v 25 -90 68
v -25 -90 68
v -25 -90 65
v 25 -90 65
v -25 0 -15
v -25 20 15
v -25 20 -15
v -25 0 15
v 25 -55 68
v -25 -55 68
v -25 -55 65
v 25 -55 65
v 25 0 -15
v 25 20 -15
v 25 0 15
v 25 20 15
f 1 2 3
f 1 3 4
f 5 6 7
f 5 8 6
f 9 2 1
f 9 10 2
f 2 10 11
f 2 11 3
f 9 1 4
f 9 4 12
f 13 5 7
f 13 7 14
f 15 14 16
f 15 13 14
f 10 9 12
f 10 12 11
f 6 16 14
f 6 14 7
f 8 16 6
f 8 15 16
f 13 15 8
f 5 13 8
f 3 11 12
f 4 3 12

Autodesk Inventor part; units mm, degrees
ref_plane "YZ Plane" through (0, 0, 0) normal (1, 0, 0) x (0, 1, 0)
ref_plane "XZ Plane" through (0, 0, 0) normal (0, 1, 0) x (-1, 0, 0)
sketch "Skizze1" plane through (0, 0, 0) normal (0, 1, 0) x (-1, 0, 0)
  line L0 (25, -15) -> (-25, -15)
  line L1 (-25, -15) -> (-25, 15)
  line L2 (-25, 15) -> (25, 15)
  line L3 (25, 15) -> (25, -15)
  line L4 (35, 0) -> (-35, 0) projected
  line L5 (0, -38.6491) -> (0, 126.8947) projected
  point P0 (0, 0)
  dimension "d0" = 50
  dimension "d1" = 30
extrude "Extrusion1" add sketch "Skizze1" along normal blind 20
ref_plane "Arbeitsebene1" through (-25, 0, 68) normal (0, 0, 1) x (1, 0, 0)
sketch "Skizze10" plane through (-25, 0, 68) normal (0, 0, 1) x (1, 0, 0)
  line L0 (50, -55) -> (0, -55)
  line L1 (0, -55) -> (0, -90)
  line L2 (0, -90) -> (50, -90)
  line L3 (50, -90) -> (50, -55)
  line L4 (0, 0) -> (50, 0) projected
  line L5 (25, -112) -> (25, 42) projected
  point P0 (25, 0)
  dimension "d44" = 50
  dimension "d45" = 35
  dimension "d46" = 55
extrude "Extrusion7" add sketch "Skizze10" against normal blind 3
sketch "Skizze11" plane through (-25, 0, 15) normal (0, 0, 1) x (1, 0, 0)
  ellipse E0 centre (25, 10) end of major axis (45, 10) minor radius 7.5
  line L0 (0, 0) -> (50, 0) projected
  line L1 (50, 0) -> (50, 20) projected
  point P0 (25, 0)
  dimension "d49" = 10
  dimension "d50" = 25
  dimension "d51" = 20
  dimension "d52" = 7.5
sketch "Skizze12" plane through (0, 0, 0) normal (1, 0, 0) x (0, 1, 0)
  line L0 (0, 15) -> (20, 15) projected
  line L1 (-55, 68) -> (-90, 68) projected
  spline S0 degree 4 poles (10, 15) (9.9748, 21.2064) (9.8777, 76.735) (3.1904, 71.0475) (-60.3346, 101.6715) (-72.933, 67.6671) (-72.5, 68) knots 0 0 0 0 0 0.382337 0.571486 1 1 1 1 1
  line L2 (-90, 68) -> (-90, 98.8668)
  line L3 (-90, 68) -> (-90, 65) projected
  line L4 (7.9908, 69.6224) -> (-7.9908, 80.6145) construction
  arc A0 (4.9597, 69.8562) -> (-6.6882, 77.8676) centre (-9.7151, 60.9936) ccw construction
  line L5 (-38.6667, 91.0844) -> (-71.5552, 78.5361) construction
  arc A1 (-42.1089, 86.8611) -> (-66.1746, 77.679) centre (-43.7525, 55.0405) ccw construction
  line L6 (10.0269, 8.386) -> (9.9731, 21.614) construction
  arc A2 (10.0019, 20.2911) -> (10.0449, 9.7091) centre (607.2373, 17.4262) ccw construction
  line L7 (-90, 68) -> (-90, 65) projected
  point P0 (0, 0)
  point P1 (0, 75.1185)
  point P2 (-55.1109, 84.8102)
  dimension "d54" = 10
  dimension "d59" = 0.409
  dimension "d60" = 0.5998
  dimension "d61" = 1.0884
  dimension "d62" = 20.884
  dimension "d63" = 69.116
  dimension "d64" = 16.8102
  dimension "d65" = 34.8891
  dimension "d66" = 17.5
  dimension "d67" = 60.1185
  dimension "d68" = 90
  dimension "d69" = 55.48
  dimension "d70" = 9.9999
  dimension "d71" = 89.767
properties part number "_3D-Druck"
